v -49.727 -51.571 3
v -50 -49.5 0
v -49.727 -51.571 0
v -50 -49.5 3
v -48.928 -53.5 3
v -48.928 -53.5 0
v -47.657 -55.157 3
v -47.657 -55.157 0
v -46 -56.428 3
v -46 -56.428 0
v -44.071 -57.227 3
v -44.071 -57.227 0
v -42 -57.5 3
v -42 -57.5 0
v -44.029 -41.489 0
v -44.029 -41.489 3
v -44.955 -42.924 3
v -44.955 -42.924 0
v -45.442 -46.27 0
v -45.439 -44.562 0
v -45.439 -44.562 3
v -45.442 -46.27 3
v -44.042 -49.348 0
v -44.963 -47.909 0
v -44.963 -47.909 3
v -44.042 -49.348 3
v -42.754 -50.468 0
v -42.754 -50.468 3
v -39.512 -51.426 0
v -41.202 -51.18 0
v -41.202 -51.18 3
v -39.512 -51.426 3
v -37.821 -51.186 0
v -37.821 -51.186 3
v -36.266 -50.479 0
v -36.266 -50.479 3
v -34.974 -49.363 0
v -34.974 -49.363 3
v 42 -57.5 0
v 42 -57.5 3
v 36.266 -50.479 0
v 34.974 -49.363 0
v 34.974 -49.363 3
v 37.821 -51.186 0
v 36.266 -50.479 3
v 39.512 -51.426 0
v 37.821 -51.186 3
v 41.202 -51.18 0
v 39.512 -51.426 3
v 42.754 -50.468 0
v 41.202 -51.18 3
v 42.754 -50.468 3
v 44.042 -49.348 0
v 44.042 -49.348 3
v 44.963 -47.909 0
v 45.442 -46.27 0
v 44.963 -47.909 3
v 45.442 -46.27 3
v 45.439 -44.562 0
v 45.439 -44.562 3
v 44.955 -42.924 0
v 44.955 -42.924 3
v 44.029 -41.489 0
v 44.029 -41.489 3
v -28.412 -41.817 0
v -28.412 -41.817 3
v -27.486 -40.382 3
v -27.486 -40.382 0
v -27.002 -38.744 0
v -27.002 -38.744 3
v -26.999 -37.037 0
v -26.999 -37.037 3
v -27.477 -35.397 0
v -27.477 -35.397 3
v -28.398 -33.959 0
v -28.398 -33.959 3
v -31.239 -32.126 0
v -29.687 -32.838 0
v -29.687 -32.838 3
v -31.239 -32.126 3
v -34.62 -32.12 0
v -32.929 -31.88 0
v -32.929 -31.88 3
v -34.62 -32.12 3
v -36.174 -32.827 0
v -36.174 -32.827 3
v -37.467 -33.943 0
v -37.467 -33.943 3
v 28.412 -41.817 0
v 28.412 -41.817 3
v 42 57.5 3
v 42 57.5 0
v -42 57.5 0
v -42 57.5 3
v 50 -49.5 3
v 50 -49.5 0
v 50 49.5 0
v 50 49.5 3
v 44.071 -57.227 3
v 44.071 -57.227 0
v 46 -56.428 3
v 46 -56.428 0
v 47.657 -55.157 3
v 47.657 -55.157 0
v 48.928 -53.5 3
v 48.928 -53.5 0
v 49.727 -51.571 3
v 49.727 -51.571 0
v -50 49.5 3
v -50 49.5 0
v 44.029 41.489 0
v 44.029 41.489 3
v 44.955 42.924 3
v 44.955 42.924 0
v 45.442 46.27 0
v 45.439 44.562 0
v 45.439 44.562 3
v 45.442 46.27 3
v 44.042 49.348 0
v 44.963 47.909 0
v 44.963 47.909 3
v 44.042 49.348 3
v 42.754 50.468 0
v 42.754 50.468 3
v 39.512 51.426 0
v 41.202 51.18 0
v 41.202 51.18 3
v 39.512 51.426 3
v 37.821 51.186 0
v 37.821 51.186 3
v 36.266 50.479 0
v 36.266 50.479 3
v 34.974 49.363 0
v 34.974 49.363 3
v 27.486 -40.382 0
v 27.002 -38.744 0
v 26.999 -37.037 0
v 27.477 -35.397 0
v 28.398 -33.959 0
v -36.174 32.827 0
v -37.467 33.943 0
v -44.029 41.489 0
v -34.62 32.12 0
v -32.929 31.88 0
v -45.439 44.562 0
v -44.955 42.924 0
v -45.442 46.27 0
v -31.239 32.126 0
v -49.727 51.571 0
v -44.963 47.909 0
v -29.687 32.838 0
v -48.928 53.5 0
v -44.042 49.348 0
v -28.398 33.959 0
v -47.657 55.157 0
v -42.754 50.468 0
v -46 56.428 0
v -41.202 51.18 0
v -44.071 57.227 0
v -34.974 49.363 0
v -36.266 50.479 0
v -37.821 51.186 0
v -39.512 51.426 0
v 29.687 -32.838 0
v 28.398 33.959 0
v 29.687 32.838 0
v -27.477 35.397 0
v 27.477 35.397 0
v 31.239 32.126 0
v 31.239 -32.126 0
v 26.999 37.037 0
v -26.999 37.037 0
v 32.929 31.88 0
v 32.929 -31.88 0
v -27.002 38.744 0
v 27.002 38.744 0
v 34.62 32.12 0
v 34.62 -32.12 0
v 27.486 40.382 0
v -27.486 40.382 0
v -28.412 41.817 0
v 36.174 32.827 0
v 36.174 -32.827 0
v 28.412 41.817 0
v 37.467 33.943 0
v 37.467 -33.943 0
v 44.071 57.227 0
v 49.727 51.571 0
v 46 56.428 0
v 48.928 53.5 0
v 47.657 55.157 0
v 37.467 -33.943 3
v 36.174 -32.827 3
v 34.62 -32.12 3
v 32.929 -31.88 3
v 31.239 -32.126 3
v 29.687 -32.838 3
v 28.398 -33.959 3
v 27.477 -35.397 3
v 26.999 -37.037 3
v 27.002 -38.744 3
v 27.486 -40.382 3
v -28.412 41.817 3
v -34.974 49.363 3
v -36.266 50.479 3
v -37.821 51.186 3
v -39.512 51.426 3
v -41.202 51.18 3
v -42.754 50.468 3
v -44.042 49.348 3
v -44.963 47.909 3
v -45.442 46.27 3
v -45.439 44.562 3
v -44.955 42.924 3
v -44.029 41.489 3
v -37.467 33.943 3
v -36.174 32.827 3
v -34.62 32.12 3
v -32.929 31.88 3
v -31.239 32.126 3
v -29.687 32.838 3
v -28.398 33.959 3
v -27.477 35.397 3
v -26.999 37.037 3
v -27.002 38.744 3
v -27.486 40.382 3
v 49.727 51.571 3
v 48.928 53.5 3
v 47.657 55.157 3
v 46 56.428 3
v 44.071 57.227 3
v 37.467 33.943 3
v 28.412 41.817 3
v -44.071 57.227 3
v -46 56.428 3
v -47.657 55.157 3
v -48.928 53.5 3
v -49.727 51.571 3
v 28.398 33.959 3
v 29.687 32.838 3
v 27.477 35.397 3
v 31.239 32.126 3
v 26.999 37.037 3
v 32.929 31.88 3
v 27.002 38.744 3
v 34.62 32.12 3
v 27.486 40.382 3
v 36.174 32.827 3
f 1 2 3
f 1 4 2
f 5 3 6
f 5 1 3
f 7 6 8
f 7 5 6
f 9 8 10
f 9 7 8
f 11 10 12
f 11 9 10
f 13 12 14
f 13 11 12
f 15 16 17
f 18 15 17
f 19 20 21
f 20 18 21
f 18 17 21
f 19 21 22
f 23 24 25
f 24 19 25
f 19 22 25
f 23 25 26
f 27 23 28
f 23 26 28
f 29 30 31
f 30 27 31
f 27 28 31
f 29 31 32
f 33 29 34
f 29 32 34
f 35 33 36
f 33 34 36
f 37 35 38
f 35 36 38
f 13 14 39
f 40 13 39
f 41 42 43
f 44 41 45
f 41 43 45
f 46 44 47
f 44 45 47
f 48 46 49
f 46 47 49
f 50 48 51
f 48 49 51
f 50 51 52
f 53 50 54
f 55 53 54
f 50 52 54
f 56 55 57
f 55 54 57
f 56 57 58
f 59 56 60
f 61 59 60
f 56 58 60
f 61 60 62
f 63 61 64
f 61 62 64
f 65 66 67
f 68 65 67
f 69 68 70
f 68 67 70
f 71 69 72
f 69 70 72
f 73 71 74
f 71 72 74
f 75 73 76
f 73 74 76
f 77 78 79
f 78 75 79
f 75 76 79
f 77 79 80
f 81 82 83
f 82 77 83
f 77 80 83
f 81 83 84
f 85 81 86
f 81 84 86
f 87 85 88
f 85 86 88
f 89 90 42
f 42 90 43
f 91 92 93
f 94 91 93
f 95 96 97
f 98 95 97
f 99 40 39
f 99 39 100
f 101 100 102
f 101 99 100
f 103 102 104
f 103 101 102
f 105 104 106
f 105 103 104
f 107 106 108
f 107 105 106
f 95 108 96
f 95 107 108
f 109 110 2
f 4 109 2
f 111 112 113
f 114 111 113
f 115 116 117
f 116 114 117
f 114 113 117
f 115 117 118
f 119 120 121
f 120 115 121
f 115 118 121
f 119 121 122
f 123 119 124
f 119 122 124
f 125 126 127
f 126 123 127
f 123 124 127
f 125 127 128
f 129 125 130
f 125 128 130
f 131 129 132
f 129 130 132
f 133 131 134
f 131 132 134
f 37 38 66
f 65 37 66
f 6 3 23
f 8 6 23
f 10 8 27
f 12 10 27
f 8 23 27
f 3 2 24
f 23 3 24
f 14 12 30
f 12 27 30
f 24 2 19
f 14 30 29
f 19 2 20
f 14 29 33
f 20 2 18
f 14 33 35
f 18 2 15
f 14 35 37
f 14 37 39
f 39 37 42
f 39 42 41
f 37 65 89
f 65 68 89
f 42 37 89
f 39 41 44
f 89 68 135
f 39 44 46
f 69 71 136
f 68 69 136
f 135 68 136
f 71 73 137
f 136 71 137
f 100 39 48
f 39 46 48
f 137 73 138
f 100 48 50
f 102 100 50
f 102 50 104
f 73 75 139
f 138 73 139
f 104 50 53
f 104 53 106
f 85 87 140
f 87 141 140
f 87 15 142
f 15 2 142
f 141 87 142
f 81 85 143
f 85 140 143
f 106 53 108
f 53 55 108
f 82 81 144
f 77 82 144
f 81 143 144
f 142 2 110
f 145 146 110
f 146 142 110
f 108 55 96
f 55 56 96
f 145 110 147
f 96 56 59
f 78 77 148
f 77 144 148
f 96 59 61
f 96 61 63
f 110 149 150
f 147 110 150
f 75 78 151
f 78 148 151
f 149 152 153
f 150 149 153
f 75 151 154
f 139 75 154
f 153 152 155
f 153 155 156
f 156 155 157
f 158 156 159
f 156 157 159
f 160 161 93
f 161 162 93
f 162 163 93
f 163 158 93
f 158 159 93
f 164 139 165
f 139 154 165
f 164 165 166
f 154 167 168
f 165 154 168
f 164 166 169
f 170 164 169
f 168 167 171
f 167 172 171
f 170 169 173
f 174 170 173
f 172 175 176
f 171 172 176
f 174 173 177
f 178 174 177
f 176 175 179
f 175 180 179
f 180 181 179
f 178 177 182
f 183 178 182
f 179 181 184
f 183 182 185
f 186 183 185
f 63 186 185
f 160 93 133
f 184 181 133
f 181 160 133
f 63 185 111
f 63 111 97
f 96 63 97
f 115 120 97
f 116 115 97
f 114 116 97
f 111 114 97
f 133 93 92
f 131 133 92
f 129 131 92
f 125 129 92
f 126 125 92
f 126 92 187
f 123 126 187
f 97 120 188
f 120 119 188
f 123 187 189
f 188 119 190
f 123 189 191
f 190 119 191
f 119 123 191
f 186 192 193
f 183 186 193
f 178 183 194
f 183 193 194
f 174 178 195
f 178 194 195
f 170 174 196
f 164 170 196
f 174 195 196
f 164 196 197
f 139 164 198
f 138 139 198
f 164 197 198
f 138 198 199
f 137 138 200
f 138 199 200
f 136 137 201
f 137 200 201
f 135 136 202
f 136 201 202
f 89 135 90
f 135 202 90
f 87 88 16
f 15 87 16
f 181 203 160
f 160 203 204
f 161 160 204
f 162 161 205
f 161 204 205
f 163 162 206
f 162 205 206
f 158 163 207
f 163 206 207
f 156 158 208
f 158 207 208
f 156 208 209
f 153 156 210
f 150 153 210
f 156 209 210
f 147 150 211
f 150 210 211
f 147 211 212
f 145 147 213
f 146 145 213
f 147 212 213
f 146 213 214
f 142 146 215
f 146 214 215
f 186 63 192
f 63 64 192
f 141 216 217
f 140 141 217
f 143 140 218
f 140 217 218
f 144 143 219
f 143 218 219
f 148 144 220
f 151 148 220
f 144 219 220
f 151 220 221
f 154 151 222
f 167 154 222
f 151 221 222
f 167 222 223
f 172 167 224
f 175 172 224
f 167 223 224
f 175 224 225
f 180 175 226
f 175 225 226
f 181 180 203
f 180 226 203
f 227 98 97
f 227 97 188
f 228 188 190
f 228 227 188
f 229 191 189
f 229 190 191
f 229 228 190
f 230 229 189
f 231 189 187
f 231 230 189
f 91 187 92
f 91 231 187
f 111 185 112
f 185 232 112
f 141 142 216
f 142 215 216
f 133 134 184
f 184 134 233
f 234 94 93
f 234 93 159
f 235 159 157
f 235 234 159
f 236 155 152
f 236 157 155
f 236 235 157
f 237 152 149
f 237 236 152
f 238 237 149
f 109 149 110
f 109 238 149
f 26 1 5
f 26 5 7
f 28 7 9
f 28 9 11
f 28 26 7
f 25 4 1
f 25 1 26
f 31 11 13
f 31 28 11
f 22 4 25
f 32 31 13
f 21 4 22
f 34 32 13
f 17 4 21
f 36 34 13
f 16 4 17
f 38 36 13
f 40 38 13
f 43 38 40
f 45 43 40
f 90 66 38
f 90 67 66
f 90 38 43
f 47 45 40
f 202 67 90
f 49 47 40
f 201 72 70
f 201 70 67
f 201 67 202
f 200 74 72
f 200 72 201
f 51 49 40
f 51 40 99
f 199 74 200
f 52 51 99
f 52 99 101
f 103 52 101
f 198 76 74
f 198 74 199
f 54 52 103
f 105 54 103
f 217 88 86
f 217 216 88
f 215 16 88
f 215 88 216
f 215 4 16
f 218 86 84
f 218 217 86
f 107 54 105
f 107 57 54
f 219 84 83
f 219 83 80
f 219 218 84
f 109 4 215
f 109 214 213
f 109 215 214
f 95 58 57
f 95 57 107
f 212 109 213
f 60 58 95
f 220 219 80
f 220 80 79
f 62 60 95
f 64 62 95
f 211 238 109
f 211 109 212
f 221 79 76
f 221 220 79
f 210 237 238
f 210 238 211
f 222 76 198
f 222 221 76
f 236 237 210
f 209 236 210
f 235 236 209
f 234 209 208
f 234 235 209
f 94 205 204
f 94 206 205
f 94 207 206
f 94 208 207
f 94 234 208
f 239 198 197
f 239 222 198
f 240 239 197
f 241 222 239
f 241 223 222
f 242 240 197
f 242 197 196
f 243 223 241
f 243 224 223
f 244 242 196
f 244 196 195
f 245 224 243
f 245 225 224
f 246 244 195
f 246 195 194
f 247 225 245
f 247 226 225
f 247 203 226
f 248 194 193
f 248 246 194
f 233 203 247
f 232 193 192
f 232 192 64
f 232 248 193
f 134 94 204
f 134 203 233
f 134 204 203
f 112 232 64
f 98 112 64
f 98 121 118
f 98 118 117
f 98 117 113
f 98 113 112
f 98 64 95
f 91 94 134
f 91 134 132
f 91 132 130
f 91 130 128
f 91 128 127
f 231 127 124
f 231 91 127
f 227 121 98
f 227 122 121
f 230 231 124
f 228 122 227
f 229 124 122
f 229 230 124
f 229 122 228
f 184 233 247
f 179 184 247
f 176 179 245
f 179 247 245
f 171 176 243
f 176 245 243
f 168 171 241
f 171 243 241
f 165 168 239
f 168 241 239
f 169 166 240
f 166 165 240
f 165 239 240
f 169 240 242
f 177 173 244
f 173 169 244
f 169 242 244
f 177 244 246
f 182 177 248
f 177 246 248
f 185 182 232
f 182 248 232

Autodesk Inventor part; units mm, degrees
ref_plane "YZ Plane" through (0, 0, 0) normal (1, 0, 0) x (0, 1, 0)
ref_plane "XZ Plane" through (0, 0, 0) normal (0, 1, 0) x (-1, 0, 0)
ref_plane "XY Plane" through (0, 0, 0) normal (0, 0, 1) x (1, 0, 0)
sketch "Sketch1" plane through (0, 0, 0) normal (0, 0, 1) x (1, 0, 0)
  line L0 (-50, -57.5) -> (50, -57.5)
  line L1 (50, -57.5) -> (50, 57.5)
  line L2 (50, 57.5) -> (-50, 57.5)
  line L3 (-50, 57.5) -> (-50, -57.5)
  line L4 (-50, -57.5) -> (50, 57.5) construction
  line L5 (50, -57.5) -> (-50, 57.5) construction
  point P0 (0, 0)
  dimension "d0" = 100
  dimension "d1" = 115
extrude "Plate1" add sketch "Sketch1" along normal blind 3
sketch "Sketch5" plane through (0, 0, 3) normal (0, 0, 1) x (1, 0, 0)
  line L0 (50, -57.5) -> (-50, -57.5) construction
  line L1 (50, 57.5) -> (50, -57.5) construction
  line L2 (-50, 57.5) -> (50, 57.5) construction
  line L3 (-50, -57.5) -> (-50, 57.5) construction
  line L4 (50, 57.5) -> (-50, 57.5) construction
  line L5 (-50, 57.5) -> (50, -57.5) construction
  line L6 (-39.5011, 45.4263) -> (-32.9394, 37.8803) construction
  line L7 (-44.0288, 41.4892) -> (-37.467, 33.9432)
  line L8 (-28.4117, 41.8173) -> (-34.9735, 49.3634)
  arc A0 (-34.9735, 49.3634) -> (-44.0288, 41.4892) centre (-39.5011, 45.4263) ccw
  arc A1 (-37.467, 33.9432) -> (-28.4117, 41.8173) centre (-32.9394, 37.8803) ccw
  point P0 (0, 0)
  point P1 (-36.2202, 41.6533)
  dimension "d22" = 12
  dimension "d23" = 10
  dimension "d24" = 16
extrude "Cut1" cut sketch "Sketch5" against normal blind 3
mirror "Mirror1" about plane through (0, 0, 0) normal (0, 1, 0) of "Cut1"
mirror "Mirror2" about plane through (0, 0, 0) normal (1, 0, 0) of "Cut1", "Mirror1"
fillet "Corner Round1" radius 8 4 edges at (-50, 57.5, 1.5) (50, 57.5, 1.5) (50, -57.5, 1.5) (-50, -57.5, 1.5)
equation "\"d25\" = Thickness"
equation "\"d2\" = Thickness"
equation "\"BendReliefWidth\" = Thickness"
equation "\"BendReliefDepth\" = 0.5 * Thickness"
equation "\"CornerReliefSize\" = 4 * Thickness"
equation "\"MinimumRemnant\" = 2 * Thickness"
equation "\"TransitionRadius\" = BendRadius"
equation "\"JacobiRadiusSize\" = BendRadius"
equation "\"GapSize\" = Thickness"
equation "\"Thickness\" = 3"
equation "\"BendRadius\" = 5"
properties part number "AQUA AISI304 4vv wheel plate 150" material "Stainless Steel"
